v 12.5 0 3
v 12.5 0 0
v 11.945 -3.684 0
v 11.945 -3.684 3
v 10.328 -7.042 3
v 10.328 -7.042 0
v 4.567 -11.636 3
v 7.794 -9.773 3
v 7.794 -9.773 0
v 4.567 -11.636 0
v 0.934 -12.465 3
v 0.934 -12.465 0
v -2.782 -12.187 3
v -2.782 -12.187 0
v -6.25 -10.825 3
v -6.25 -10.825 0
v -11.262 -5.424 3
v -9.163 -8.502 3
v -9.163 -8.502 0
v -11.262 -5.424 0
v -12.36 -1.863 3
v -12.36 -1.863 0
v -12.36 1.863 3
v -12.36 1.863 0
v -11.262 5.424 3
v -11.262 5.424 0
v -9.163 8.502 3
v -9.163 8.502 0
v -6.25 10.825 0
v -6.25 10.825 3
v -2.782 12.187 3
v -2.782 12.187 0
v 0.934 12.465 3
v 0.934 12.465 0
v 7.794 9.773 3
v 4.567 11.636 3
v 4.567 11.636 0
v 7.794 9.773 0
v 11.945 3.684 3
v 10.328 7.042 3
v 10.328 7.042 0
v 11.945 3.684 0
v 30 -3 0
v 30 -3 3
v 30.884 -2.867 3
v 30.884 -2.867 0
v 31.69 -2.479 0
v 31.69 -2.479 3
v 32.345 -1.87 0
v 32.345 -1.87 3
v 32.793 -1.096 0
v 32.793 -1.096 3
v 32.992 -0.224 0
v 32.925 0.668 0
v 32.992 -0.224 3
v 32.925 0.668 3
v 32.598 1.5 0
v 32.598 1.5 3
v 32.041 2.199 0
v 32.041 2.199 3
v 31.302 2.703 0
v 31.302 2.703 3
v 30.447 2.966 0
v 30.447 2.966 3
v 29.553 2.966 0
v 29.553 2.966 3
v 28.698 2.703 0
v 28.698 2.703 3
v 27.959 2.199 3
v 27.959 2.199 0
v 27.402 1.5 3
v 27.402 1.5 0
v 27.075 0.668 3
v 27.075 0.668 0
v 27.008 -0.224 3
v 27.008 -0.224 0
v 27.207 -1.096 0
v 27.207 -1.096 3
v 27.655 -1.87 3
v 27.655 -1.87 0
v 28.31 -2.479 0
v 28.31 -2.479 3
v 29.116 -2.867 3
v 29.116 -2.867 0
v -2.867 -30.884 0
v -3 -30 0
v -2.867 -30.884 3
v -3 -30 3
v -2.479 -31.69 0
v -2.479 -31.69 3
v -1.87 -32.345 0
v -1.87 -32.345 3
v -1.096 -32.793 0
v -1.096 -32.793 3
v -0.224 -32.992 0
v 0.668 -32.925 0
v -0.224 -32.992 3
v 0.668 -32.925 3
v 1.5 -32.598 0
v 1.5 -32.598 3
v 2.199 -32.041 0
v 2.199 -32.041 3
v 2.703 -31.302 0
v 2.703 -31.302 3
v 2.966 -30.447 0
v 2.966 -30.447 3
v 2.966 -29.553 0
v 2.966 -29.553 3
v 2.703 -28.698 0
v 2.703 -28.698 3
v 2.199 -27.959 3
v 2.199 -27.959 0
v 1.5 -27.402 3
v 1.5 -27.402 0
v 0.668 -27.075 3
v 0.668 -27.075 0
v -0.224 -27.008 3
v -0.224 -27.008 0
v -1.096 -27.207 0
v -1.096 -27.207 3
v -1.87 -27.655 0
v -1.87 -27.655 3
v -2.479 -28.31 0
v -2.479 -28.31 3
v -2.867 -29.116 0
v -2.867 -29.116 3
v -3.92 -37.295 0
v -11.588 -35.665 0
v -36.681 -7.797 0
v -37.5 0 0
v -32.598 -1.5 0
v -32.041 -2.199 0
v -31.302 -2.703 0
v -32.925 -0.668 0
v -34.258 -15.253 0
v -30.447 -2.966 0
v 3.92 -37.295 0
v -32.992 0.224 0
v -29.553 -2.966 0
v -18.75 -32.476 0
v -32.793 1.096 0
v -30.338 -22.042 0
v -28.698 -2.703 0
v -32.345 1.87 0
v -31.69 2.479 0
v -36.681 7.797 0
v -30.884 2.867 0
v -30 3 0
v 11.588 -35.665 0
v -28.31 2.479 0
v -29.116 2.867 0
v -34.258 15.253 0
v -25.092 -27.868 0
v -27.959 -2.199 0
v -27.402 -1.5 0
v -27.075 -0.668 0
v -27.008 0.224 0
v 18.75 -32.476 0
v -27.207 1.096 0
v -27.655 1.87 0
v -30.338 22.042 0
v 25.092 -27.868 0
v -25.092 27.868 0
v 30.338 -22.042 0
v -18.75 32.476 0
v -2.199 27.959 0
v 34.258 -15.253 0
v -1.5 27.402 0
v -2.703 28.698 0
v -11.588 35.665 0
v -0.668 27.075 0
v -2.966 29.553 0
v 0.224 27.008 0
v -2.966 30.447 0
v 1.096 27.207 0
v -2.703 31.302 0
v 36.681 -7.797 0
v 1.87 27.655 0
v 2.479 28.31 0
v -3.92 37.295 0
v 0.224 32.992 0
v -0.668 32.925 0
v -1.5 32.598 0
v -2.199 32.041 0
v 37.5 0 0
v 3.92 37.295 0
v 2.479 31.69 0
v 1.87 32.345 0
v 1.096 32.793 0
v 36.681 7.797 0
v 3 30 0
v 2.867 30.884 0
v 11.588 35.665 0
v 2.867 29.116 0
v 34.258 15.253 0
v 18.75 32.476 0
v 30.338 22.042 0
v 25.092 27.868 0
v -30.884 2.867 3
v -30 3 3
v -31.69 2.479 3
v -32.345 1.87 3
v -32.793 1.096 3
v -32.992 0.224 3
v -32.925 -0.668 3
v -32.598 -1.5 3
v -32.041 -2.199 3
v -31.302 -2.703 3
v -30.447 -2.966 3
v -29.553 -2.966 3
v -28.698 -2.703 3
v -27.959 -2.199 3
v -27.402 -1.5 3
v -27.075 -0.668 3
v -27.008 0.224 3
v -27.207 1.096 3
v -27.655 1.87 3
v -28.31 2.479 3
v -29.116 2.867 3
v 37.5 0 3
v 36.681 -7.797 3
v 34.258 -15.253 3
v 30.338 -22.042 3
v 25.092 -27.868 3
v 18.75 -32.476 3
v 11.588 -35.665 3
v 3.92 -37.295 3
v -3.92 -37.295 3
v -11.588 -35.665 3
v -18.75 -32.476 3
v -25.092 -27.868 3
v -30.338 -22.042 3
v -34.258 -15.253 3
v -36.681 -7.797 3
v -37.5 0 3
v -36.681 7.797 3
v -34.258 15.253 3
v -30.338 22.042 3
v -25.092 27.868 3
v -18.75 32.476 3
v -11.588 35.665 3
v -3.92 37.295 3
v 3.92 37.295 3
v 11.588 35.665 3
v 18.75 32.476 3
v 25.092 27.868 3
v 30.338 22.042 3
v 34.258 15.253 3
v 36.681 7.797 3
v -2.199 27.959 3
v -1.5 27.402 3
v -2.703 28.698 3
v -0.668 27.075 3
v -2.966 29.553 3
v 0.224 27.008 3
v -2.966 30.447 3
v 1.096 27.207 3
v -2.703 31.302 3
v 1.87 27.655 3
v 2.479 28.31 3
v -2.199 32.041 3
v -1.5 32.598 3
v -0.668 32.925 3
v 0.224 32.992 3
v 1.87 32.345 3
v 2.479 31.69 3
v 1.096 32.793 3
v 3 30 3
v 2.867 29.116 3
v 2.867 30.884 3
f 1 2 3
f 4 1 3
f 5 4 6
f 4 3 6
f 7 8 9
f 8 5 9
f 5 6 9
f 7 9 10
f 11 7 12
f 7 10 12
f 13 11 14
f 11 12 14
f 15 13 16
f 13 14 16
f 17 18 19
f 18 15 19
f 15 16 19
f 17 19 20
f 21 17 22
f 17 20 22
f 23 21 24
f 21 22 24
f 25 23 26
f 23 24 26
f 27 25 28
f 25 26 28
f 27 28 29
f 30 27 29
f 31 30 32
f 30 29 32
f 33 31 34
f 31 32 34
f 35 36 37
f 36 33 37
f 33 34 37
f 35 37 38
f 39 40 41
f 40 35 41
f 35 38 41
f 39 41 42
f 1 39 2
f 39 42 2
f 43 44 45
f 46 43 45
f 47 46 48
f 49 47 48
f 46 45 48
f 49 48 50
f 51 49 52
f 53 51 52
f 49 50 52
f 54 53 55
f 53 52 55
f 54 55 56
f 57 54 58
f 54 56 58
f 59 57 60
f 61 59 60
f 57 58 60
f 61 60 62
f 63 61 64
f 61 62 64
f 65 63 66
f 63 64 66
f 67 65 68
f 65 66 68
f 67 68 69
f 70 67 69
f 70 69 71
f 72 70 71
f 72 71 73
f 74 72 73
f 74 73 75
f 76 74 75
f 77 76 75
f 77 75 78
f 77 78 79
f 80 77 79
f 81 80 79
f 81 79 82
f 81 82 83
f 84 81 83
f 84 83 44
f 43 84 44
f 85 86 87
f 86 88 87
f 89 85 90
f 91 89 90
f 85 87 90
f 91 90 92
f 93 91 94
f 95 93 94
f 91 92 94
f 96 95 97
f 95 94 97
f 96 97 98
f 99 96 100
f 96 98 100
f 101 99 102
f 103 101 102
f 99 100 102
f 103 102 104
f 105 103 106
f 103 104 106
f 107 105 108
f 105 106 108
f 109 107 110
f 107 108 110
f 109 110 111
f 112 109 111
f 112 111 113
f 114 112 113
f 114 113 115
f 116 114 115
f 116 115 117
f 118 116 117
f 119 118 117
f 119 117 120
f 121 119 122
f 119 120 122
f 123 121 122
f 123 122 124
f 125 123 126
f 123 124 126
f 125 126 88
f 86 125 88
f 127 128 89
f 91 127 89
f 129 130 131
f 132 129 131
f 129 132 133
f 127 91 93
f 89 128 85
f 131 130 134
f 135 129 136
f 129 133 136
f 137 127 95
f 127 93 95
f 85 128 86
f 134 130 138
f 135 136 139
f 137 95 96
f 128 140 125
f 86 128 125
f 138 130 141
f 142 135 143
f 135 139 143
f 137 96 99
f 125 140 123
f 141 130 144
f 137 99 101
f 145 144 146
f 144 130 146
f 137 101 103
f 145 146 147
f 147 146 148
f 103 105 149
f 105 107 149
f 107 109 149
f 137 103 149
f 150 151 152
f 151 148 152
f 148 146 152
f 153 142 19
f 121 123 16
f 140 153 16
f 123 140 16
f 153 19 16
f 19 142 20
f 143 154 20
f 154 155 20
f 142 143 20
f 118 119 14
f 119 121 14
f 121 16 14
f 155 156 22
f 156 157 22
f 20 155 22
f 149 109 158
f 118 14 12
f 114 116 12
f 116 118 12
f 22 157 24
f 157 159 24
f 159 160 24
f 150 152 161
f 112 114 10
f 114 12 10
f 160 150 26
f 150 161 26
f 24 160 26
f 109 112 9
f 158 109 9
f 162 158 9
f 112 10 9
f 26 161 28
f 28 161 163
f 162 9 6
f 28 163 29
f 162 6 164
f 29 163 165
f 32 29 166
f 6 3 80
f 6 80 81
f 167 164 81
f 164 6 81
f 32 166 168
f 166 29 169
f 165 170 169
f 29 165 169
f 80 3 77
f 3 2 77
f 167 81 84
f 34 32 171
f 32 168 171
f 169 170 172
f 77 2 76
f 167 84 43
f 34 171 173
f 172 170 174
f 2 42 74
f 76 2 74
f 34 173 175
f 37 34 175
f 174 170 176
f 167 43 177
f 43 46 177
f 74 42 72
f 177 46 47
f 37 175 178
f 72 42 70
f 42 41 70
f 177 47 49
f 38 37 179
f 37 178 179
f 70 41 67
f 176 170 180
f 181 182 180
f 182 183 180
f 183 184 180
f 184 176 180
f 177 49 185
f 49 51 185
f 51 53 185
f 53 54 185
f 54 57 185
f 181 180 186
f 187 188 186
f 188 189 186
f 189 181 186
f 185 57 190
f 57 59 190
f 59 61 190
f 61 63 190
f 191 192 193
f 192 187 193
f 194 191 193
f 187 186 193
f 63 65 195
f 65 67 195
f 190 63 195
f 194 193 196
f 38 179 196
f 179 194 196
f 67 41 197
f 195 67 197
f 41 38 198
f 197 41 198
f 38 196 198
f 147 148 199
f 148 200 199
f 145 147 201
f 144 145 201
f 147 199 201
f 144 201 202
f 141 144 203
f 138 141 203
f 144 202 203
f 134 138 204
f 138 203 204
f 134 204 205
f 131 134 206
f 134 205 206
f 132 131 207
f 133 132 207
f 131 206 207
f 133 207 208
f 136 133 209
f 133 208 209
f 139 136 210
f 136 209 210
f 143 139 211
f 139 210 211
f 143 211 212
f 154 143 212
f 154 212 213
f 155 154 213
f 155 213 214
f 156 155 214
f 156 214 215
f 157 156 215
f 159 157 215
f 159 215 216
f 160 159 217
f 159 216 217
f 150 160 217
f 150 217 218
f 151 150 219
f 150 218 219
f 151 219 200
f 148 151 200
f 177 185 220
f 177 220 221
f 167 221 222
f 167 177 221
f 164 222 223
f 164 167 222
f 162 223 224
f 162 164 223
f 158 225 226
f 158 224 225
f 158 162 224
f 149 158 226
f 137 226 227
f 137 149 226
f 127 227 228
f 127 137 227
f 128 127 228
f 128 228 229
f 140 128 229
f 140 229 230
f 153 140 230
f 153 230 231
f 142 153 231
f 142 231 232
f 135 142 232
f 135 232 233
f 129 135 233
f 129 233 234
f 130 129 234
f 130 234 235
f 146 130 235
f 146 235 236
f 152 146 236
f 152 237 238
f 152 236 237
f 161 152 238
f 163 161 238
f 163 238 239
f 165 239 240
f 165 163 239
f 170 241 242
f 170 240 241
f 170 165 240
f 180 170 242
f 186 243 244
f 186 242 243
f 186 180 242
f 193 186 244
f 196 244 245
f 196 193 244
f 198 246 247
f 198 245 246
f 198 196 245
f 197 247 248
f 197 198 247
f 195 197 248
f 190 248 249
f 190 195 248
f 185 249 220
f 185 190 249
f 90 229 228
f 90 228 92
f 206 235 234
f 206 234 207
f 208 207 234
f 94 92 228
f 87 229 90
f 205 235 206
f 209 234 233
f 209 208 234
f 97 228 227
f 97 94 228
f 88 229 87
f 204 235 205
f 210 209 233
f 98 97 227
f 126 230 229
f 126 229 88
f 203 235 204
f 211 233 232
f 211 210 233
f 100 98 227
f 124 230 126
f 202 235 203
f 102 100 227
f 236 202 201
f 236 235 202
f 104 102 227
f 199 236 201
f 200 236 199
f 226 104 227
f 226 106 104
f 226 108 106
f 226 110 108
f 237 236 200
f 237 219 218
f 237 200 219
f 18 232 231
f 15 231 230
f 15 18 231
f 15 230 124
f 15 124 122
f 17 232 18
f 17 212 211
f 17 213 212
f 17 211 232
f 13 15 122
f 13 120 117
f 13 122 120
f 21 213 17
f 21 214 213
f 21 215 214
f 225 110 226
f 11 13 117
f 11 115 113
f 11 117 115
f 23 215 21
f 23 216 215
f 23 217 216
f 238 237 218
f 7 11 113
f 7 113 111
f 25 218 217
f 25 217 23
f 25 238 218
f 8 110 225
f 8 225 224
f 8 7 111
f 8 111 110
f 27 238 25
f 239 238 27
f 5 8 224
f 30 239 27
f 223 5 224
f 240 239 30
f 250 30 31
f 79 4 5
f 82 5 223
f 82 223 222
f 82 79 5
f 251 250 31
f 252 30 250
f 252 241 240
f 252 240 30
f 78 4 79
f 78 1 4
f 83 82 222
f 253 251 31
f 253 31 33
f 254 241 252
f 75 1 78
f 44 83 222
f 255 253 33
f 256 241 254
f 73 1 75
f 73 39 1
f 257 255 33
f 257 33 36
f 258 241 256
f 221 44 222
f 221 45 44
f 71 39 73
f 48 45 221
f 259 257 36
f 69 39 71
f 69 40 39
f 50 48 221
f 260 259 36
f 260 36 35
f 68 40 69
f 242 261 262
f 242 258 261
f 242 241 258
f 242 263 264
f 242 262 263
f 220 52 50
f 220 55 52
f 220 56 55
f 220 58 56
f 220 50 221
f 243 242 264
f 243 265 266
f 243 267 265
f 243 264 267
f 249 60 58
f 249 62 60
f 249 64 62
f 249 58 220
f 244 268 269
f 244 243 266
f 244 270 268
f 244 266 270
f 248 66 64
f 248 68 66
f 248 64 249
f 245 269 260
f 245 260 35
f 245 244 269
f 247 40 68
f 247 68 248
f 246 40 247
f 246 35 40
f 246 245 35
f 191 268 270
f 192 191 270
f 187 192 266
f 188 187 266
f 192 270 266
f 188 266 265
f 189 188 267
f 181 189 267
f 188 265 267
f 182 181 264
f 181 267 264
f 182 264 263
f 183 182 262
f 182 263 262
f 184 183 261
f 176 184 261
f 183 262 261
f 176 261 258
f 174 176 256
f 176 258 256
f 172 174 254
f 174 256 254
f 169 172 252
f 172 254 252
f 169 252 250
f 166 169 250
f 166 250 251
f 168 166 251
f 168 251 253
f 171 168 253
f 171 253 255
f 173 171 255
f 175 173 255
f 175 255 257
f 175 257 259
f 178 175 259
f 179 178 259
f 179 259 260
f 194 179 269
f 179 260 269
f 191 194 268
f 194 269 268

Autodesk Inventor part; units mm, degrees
ref_plane "YZ Plane" through (0, 0, 0) normal (1, 0, 0) x (0, 1, 0)
ref_plane "XZ Plane" through (0, 0, 0) normal (0, 1, 0) x (-1, 0, 0)
ref_plane "XY Plane" through (0, 0, 0) normal (0, 0, 1) x (1, 0, 0)
sketch "Sketch1" plane through (0, 0, 0) normal (0, 0, 1) x (1, 0, 0)
  circle A0 centre (0, 0) radius 37.5
  circle A1 centre (0, 0) radius 12.5
  dimension "d15" = 25
  dimension "d16" = 75
extrude "Plate1" add sketch "Sketch1" along normal blind 3
sketch "Sketch2" plane through (0, 0, 0) normal (0, 0, -1) x (-1, 0, 0)
  line L0 (-27.3167, 25.2399) -> (172.6833, 25.2399) construction
  line L1 (172.6833, 25.2399) -> (172.6833, 5.2399) construction
  line L2 (172.6833, 5.2399) -> (-27.3167, 5.2399) construction
  line L3 (-27.3167, 5.2399) -> (-27.3167, 25.2399) construction
  point P0 (0, 0)
  point P1 (-251, -525)
  dimension "d6" = 200
  dimension "d9" = 20
mark "Mark1"
sketch "Sketch3" plane through (0, 0, 3) normal (0, 0, 1) x (1, 0, 0)
  circle A0 centre (0, 0) radius 12.5 construction
  circle A1 centre (0, 0) radius 37.5 construction
  circle A2 centre (0, 30) radius 3
  line L0 (0, 37.5) -> (0, 12.5) construction
  circle A3 centre (0, 0) radius 30 construction
  dimension "d26" = 60
  dimension "d17" = 6
  dimension "d19" = 7.5
extrude "Cut1" cut sketch "Sketch3" against normal blind 3
pattern_circular "Circular Pattern1" count 4 over 360 about axis through (0, 0, 0) along (0, 0, 1) of "Cut1"
equation "\"d20\" = Thickness"
equation "\"d2\" = Thickness"
equation "\"BendReliefWidth\" = Thickness"
equation "\"BendReliefDepth\" = 0.5 * Thickness"
equation "\"CornerReliefSize\" = 4 * Thickness"
equation "\"MinimumRemnant\" = 2 * Thickness"
equation "\"TransitionRadius\" = BendRadius"
equation "\"JacobiRadiusSize\" = BendRadius"
equation "\"GapSize\" = Thickness"
equation "\"Thickness\" = 3"
equation "\"BendRadius\" = 5"
properties part number "TRM 029 coupling ring" material "AISI 304"
